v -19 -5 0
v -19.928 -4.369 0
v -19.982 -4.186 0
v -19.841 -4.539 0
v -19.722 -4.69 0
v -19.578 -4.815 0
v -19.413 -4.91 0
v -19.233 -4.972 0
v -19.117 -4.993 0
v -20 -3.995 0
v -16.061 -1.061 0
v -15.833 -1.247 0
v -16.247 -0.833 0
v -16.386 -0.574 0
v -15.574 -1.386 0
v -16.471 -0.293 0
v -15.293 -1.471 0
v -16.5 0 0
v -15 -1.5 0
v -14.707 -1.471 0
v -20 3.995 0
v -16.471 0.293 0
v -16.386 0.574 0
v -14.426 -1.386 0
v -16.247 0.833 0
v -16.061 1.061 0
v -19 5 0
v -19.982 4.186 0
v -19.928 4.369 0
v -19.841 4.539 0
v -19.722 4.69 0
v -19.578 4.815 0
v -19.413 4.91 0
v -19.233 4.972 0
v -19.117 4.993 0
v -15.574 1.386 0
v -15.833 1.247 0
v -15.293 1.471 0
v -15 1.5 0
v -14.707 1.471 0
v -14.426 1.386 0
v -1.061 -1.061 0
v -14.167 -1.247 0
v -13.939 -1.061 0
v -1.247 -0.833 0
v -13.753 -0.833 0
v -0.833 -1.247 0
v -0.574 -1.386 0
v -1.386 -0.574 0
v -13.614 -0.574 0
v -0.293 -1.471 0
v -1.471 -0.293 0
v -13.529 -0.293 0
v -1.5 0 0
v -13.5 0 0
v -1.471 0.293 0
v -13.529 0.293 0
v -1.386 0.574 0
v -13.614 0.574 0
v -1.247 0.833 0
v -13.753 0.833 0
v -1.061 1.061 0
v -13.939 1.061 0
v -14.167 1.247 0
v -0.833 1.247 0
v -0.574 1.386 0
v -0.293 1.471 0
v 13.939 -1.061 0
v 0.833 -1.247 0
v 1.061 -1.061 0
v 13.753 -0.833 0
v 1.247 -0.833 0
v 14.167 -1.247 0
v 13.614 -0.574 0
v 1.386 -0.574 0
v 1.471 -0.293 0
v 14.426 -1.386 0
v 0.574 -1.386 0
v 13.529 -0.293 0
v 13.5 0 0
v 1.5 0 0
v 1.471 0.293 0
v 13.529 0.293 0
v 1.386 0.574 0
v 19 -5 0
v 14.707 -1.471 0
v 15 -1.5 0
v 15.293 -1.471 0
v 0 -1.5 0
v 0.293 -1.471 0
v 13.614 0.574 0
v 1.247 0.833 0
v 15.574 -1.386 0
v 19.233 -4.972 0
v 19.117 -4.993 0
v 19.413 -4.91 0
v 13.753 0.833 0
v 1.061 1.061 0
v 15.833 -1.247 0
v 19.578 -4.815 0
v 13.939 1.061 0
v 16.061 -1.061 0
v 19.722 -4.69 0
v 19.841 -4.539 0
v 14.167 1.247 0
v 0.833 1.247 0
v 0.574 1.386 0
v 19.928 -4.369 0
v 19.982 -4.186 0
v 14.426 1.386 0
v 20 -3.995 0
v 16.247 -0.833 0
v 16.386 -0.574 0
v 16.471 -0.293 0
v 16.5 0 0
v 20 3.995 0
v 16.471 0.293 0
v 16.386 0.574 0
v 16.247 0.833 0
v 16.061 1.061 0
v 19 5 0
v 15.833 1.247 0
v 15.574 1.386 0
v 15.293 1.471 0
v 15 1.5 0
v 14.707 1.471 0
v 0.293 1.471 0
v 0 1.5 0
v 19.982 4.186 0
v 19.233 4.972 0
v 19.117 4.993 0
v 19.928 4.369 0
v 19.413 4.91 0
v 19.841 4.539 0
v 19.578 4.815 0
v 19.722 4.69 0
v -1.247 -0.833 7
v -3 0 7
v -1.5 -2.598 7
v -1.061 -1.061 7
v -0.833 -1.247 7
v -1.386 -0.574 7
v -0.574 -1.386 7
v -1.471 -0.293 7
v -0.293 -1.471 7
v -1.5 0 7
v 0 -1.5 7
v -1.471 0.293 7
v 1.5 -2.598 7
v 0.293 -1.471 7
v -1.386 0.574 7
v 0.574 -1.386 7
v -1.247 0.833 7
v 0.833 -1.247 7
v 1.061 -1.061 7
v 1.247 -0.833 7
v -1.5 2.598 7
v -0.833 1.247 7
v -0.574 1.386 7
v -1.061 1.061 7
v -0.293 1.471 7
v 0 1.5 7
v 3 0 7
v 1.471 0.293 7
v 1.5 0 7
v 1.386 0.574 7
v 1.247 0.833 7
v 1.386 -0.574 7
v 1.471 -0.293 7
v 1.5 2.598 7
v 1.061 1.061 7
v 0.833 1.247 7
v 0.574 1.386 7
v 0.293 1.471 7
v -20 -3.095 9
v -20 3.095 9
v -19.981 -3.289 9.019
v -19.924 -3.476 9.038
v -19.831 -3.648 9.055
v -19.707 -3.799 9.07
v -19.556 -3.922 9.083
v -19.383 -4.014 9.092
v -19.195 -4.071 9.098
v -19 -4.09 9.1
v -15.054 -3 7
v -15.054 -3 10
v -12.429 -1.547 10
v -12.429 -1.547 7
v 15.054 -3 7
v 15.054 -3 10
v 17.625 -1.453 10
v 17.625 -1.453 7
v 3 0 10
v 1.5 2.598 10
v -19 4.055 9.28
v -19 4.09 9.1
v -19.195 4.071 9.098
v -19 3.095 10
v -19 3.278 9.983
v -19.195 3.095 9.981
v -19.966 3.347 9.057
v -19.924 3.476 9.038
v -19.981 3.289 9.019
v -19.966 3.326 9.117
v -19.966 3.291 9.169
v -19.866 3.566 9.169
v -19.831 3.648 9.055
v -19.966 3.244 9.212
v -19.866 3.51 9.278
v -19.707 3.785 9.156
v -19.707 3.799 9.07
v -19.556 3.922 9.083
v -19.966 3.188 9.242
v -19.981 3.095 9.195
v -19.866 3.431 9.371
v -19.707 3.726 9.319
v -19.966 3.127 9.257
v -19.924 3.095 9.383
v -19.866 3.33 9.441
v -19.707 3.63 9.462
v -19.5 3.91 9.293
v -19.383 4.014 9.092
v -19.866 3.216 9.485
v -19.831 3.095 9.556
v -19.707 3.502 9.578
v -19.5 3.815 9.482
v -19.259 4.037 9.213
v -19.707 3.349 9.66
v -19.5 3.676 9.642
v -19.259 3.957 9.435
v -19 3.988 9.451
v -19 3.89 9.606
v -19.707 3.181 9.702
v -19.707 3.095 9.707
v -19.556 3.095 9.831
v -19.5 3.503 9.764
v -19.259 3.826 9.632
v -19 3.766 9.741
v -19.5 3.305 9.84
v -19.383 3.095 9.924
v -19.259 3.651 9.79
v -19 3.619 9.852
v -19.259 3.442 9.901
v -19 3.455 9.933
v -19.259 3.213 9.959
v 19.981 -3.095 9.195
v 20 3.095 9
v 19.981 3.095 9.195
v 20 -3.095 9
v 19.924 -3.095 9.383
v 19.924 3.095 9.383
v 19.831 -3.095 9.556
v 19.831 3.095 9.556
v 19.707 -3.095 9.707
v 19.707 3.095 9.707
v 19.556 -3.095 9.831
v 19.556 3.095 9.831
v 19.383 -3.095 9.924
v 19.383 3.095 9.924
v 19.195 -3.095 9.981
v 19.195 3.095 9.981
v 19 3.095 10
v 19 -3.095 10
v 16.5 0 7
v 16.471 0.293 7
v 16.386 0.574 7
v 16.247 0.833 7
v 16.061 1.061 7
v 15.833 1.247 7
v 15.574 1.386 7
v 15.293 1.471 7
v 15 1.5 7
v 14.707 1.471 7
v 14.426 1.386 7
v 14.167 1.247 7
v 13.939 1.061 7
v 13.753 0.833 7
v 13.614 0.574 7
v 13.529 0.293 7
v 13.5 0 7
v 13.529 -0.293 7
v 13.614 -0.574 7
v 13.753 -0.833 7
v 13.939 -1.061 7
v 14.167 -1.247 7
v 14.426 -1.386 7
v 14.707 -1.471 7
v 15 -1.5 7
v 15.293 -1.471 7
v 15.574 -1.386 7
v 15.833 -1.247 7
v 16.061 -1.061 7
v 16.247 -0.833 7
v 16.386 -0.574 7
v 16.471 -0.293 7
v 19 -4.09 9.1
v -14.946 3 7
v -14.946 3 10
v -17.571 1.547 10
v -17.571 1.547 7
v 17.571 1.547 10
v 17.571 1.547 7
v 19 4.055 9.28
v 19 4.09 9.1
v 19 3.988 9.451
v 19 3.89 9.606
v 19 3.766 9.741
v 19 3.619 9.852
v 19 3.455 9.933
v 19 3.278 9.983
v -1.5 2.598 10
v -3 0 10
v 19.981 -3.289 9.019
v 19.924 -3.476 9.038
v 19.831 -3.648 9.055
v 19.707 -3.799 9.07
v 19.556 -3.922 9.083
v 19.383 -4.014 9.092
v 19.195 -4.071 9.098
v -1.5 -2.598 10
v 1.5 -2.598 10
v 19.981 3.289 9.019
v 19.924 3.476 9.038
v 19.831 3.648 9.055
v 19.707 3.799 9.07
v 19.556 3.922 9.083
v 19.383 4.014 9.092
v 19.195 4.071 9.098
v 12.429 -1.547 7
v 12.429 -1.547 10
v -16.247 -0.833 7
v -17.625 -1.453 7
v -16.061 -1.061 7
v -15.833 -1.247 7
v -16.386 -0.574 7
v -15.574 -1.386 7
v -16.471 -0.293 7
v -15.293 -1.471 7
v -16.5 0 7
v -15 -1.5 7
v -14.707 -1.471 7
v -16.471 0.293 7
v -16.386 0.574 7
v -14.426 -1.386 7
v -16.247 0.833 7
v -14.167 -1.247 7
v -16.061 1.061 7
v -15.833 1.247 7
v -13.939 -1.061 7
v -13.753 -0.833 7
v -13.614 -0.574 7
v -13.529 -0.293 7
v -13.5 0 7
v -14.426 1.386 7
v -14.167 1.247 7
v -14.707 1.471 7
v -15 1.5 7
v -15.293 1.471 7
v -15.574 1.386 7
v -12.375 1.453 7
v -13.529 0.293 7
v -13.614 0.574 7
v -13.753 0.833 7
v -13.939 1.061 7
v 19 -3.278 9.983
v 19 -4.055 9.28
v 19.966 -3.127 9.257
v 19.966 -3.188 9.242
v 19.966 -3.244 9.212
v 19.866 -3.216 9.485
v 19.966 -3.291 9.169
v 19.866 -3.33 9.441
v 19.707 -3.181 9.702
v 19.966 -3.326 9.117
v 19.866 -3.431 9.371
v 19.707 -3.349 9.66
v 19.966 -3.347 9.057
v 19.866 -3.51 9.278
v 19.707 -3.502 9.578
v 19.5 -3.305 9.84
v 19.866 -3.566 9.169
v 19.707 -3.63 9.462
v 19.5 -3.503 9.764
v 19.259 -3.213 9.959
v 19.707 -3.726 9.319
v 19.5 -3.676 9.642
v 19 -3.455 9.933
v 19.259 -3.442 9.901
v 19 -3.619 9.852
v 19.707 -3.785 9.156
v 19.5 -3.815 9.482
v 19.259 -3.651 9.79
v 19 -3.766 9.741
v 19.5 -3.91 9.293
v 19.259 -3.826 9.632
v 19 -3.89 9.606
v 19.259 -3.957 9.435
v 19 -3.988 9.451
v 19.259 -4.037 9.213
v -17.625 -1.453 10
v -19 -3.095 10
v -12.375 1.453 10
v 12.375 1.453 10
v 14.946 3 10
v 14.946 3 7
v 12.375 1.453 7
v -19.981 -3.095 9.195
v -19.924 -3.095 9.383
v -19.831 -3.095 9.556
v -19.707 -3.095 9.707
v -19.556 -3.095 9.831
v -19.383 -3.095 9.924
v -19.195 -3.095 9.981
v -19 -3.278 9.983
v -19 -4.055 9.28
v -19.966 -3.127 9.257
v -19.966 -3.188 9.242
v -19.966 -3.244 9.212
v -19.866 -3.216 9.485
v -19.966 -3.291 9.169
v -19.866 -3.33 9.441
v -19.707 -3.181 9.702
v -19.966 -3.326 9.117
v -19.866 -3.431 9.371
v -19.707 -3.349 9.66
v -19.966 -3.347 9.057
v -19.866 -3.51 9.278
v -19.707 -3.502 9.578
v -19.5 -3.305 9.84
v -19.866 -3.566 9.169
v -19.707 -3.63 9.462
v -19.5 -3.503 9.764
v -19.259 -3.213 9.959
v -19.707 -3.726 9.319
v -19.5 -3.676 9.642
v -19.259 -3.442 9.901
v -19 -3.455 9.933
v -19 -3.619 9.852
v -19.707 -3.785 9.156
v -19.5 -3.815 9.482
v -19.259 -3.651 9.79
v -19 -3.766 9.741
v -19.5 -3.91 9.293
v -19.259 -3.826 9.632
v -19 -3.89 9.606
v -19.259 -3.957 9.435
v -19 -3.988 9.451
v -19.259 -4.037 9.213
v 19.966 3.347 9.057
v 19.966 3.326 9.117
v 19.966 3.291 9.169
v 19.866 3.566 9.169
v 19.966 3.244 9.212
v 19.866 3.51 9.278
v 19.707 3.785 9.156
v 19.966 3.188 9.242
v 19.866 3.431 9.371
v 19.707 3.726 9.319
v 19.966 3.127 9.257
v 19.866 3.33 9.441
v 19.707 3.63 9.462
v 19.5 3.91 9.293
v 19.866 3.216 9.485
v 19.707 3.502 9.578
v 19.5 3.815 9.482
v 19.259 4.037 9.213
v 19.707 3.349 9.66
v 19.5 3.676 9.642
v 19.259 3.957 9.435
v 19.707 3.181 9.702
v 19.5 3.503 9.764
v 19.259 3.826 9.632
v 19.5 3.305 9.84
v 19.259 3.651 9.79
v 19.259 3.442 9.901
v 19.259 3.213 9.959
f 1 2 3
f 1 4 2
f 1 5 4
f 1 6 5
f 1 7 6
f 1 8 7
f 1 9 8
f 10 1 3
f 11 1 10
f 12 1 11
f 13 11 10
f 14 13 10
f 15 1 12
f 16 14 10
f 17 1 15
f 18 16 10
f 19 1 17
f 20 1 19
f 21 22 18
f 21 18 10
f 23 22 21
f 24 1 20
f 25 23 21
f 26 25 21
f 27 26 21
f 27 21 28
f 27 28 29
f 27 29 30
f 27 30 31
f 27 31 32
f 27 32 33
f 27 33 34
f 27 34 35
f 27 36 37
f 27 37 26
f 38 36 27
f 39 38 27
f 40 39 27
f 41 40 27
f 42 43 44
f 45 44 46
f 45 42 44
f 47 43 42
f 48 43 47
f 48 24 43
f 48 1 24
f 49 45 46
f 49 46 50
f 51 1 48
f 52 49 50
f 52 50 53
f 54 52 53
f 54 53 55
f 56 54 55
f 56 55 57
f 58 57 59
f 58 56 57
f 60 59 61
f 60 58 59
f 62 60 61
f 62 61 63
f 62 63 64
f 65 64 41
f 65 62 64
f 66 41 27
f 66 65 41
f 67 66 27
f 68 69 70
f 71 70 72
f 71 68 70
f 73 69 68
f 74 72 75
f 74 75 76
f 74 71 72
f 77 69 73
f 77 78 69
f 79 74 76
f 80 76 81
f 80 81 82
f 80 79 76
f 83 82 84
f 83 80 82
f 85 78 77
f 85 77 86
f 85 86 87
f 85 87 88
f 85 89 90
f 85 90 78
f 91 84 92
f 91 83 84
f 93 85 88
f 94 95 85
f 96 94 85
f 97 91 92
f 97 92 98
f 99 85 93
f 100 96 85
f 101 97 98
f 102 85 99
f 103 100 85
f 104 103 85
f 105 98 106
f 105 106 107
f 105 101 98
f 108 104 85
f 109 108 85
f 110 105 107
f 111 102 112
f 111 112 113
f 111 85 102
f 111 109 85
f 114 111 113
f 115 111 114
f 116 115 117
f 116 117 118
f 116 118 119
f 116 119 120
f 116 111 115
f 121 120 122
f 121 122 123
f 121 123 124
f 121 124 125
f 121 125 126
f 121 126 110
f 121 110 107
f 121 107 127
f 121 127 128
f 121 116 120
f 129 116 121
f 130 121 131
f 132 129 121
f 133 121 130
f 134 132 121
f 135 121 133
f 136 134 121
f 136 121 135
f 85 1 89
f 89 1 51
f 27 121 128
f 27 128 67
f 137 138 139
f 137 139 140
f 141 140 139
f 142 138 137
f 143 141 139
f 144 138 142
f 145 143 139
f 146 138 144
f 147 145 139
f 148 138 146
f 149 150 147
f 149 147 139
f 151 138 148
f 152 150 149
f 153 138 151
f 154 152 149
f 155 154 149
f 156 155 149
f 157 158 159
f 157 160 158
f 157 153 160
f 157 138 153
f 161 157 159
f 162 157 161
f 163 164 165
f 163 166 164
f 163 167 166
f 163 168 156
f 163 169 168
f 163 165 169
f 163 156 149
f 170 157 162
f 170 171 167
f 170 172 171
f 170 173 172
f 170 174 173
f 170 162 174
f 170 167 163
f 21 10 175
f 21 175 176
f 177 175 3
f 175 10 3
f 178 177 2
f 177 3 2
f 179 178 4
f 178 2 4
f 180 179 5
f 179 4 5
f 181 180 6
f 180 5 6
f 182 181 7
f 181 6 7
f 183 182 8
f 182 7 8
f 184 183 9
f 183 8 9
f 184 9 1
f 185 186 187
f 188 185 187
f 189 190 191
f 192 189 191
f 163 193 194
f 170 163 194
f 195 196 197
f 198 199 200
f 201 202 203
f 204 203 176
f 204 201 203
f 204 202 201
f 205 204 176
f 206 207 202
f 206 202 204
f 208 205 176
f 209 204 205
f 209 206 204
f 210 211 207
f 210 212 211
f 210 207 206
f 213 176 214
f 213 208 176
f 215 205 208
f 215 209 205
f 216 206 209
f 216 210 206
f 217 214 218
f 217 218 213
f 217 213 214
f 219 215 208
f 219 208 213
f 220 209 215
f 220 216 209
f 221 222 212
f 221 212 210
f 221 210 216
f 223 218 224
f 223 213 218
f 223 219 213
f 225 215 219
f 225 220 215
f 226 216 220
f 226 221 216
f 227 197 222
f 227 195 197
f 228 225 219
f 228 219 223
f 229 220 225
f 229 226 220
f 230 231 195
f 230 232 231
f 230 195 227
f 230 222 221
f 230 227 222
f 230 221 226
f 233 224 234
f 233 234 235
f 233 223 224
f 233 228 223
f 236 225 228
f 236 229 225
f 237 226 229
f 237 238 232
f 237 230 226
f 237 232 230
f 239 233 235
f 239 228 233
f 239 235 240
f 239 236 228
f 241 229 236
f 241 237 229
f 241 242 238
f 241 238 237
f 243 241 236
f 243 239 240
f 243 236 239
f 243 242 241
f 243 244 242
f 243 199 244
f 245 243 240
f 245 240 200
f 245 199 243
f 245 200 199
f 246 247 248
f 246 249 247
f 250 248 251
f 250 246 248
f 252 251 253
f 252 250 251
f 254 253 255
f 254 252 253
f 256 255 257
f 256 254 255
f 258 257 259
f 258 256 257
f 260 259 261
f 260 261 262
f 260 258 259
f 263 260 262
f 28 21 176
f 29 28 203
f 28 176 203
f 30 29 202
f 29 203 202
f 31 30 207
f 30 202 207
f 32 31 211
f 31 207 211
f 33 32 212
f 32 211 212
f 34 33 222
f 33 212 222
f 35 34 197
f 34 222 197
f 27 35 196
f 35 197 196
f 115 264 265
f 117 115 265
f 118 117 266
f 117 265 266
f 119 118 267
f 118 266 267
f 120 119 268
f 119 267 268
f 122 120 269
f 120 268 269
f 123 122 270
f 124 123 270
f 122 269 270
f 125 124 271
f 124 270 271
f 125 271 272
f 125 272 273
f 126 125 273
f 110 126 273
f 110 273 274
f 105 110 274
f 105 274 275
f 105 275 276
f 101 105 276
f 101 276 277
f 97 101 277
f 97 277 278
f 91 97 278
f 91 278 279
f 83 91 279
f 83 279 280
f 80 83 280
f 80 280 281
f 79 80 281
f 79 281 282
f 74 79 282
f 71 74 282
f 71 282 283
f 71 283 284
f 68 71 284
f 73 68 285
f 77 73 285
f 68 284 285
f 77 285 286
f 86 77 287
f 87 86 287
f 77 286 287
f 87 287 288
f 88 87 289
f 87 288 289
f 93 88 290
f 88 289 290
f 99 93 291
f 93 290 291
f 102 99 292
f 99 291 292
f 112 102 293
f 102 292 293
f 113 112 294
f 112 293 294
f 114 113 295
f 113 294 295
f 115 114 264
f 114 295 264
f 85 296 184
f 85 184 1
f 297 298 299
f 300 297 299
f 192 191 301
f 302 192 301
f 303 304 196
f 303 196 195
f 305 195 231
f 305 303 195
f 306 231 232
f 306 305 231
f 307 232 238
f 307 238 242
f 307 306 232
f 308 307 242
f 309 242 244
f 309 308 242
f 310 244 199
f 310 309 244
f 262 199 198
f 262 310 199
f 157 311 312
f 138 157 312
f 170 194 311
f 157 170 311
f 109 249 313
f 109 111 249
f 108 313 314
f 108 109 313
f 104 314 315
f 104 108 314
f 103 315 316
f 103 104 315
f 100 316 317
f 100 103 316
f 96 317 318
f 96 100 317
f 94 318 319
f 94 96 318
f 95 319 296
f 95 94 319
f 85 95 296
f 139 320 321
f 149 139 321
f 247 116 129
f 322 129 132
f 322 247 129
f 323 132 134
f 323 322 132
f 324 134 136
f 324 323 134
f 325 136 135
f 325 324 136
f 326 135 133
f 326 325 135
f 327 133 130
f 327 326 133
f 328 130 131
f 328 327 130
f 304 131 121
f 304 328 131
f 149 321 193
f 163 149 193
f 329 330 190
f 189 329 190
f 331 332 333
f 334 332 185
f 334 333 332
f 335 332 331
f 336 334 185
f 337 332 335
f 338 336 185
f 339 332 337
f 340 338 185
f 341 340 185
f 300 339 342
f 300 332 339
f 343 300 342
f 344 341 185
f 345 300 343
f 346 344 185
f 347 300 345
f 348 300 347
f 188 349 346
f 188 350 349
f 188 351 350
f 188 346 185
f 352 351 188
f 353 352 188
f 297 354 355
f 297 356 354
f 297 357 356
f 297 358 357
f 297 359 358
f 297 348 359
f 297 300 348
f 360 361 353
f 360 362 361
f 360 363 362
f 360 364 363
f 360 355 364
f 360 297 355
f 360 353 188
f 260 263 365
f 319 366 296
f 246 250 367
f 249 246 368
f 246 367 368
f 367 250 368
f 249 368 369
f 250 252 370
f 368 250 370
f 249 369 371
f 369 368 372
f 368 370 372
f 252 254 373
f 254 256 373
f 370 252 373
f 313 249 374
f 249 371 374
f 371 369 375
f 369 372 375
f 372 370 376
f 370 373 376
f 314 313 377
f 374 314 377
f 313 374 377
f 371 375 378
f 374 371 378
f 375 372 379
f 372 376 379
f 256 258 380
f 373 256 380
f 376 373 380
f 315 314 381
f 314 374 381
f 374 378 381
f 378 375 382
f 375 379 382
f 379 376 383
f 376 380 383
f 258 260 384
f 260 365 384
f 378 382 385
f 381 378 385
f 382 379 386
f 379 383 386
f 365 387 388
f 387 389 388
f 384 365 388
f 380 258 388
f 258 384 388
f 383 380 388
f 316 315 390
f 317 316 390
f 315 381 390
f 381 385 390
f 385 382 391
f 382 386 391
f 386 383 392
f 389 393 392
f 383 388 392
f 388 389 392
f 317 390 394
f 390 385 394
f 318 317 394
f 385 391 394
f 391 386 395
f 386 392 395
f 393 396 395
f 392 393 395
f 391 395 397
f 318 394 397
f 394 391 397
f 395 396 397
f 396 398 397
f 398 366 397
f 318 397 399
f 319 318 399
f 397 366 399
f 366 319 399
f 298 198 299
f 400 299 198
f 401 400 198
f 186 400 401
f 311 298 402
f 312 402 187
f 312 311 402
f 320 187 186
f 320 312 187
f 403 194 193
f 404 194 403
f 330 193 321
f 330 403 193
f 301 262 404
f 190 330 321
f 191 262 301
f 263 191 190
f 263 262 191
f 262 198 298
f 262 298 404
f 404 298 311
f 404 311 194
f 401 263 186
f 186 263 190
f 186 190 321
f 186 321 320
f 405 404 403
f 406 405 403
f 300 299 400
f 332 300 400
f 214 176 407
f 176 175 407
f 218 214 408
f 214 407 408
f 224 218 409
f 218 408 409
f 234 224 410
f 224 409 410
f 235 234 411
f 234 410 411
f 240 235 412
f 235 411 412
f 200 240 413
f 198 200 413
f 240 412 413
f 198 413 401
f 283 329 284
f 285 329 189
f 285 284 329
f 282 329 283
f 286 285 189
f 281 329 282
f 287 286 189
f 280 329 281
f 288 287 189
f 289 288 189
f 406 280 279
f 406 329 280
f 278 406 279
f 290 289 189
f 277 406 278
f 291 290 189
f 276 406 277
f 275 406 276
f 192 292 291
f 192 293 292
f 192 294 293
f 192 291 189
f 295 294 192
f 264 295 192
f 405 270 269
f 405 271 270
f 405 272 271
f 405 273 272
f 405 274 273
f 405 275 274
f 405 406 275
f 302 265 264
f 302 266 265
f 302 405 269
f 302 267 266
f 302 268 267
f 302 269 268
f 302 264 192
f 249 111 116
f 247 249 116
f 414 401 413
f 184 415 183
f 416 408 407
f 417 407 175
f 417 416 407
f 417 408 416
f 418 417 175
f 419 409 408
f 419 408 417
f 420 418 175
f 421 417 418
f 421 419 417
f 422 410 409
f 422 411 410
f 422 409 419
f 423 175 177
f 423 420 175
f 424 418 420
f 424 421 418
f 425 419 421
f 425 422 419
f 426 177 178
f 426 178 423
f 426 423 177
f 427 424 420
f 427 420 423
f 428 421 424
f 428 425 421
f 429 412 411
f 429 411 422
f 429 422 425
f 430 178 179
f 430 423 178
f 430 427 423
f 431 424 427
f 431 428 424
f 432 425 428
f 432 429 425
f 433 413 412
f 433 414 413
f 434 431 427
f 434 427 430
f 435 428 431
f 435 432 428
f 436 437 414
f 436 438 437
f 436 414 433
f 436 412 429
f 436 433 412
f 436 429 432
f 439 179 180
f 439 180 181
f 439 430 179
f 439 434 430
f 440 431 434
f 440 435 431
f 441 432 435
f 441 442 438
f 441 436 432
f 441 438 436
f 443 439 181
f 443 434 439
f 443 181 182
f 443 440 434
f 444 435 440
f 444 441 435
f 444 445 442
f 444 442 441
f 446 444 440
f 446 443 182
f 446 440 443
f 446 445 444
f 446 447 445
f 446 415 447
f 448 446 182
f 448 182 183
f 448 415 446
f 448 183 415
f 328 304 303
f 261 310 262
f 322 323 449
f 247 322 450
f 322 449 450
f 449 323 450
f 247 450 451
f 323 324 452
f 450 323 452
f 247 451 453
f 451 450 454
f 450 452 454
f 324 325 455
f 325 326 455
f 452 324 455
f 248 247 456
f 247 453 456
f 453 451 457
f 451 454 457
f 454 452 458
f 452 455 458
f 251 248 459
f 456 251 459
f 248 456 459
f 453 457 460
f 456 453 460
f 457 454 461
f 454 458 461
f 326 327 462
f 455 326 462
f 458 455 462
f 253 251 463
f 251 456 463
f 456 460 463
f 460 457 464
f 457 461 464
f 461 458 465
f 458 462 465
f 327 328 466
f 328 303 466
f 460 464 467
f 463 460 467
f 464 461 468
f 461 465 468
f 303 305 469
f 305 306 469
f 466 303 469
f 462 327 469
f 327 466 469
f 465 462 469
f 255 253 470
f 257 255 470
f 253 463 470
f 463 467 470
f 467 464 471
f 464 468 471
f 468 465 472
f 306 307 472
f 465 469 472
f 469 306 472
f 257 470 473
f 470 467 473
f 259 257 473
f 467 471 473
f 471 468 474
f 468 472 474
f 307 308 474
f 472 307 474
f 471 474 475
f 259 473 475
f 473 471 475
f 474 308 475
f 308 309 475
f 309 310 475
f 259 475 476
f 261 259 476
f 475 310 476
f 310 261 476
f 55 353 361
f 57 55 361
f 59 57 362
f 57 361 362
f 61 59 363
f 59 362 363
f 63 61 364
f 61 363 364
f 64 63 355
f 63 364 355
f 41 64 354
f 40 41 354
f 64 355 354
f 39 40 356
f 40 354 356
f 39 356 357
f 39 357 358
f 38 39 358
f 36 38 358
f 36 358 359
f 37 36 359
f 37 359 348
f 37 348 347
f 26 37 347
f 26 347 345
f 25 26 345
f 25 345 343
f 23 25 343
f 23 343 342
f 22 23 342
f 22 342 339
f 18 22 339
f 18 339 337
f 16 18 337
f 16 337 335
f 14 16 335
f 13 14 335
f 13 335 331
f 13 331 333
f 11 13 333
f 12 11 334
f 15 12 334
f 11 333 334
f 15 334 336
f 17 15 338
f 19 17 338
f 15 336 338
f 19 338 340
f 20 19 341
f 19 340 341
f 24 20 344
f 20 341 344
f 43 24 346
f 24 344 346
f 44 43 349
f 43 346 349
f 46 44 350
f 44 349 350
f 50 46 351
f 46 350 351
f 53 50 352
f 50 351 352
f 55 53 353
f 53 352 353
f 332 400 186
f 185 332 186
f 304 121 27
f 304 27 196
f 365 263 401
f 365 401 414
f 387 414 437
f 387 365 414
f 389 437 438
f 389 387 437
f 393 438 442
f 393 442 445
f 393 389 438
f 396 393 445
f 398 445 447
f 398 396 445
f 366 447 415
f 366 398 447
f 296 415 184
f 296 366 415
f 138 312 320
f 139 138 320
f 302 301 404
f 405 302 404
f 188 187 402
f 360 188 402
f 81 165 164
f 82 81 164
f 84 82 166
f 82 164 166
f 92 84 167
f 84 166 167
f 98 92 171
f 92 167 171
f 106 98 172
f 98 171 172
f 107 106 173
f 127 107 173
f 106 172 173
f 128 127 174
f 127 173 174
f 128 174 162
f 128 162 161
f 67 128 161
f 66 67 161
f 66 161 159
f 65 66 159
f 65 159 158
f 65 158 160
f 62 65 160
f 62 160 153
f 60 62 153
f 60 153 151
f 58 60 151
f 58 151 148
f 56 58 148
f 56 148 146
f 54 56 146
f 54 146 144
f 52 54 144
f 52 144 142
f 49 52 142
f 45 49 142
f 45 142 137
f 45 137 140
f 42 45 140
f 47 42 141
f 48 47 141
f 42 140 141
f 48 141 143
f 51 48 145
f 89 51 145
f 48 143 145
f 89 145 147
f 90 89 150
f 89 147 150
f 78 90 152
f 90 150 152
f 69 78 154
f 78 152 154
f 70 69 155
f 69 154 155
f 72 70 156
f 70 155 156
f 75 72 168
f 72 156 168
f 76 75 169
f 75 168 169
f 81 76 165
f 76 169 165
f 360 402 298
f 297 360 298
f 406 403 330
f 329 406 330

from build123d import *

# Parameters (mm, degrees)
F1_DEPTH      = 20
F1_DEPTH_BACK = 20
F2_R          = 1.5
F3_DEPTH      = 10
F5_DEPTH      = 3
F6_R          = 1
F7_R          = 1


with BuildPart() as f1:
    # F0 (on Right) → F1 (new body, two sides)
    with BuildSketch(Plane.YZ) as f1_sk:
        with BuildLine():
            Line((-5, 0), (0, 0))
            Line((0, 0), (5, 0))
            Line((5, 0), (4.0900496281, 9.099503719))
            ThreePointArc((4.0900496281, 9.099503719), (3.7660177586, 9.7414525336), (3.0950124379, 10))
            Line((3.0950124379, 10), (0, 10))
            Line((0, 10), (-3.0950124379, 10))
            ThreePointArc((-3.0950124379, 10), (-3.7660177586, 9.7414525336), (-4.0900496281, 9.099503719))
            Line((-4.0900496281, 9.099503719), (-5, 0))
        make_face()
    extrude(amount=F1_DEPTH)
    extrude(f1_sk.sketch, amount=-F1_DEPTH_BACK)

    # F2 (on face) → F3 (cut, through all)
    with BuildSketch(Plane.XY.offset(10)):
        with Locations((-15, 0)):
            Circle(F2_R)
        with Locations((15, 0)):
            Circle(F2_R)
        Circle(F2_R)
    extrude(amount=-F3_DEPTH, mode=Mode.SUBTRACT)

    # F4 (on face) → F5 (cut)
    with BuildSketch(Plane.XY.offset(10)):
        Polygon((-12.3749576506, 1.4532932788), (-14.9460677239, 3), (-17.5711100733, 1.5467067212), (-17.6250423494, -1.4532932788), (-15.0539322761, -3), (-12.4288899267, -1.5467067212), align=None)
        Polygon((17.5711100733, 1.5467067212), (14.9460677239, 3), (12.3749576506, 1.4532932788), (12.4288899267, -1.5467067212), (15.0539322761, -3), (17.6250423494, -1.4532932788), align=None)
        Polygon((1.5, 2.5980762114), (-1.5, 2.5980762114), (-3, 0), (-1.5, -2.5980762114), (1.5, -2.5980762114), (3, 0), align=None)
    extrude(amount=-F5_DEPTH, mode=Mode.SUBTRACT)

    # F6
    f6_edges = [f1.edges().sort_by_distance(p)[0] for p in [
        (20, 0, 10),
    ]]
    fillet(f6_edges, radius=F6_R)

    # F7
    f7_edges = [f1.edges().sort_by_distance(p)[0] for p in [
        (-20, 0, 10),
    ]]
    fillet(f7_edges, radius=F7_R)


solid = f1.part
